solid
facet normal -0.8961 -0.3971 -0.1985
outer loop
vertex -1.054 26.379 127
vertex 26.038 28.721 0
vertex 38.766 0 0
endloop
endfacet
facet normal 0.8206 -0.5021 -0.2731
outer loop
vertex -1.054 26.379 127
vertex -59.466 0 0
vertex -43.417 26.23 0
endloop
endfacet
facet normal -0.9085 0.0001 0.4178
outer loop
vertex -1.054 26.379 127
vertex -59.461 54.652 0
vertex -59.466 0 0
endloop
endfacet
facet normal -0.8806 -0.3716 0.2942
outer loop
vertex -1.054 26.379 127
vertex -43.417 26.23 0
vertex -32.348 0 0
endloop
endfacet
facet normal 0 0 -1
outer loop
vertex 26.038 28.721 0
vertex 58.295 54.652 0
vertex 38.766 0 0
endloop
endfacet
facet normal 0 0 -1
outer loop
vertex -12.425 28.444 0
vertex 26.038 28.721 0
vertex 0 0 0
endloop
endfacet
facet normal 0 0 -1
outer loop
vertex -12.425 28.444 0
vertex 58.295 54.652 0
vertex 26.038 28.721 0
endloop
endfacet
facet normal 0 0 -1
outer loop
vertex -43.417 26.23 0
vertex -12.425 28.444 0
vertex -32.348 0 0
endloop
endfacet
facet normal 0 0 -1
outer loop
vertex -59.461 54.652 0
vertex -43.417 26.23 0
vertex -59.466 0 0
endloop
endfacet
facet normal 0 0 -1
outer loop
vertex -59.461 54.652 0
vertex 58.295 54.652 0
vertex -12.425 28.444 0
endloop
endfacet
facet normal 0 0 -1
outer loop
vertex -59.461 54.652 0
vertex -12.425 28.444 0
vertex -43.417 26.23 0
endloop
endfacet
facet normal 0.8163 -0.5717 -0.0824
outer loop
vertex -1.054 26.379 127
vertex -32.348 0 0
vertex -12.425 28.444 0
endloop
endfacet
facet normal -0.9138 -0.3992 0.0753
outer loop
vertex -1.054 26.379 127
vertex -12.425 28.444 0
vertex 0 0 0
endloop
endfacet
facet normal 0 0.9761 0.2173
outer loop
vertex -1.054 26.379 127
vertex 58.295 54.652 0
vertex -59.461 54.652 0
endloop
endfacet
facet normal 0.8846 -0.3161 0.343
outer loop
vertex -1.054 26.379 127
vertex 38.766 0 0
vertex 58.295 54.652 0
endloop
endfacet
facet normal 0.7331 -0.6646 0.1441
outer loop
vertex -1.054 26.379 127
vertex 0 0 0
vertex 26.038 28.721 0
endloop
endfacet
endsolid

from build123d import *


with BuildPart() as f3:
    # F0 (on Top) → F3 section 0
    with BuildSketch(Plane.XY, mode=Mode.PRIVATE) as f3_s0:
        Polygon((58.2950860262, 54.6516403556), (-59.4609826803, 54.6516403556), (-59.4657808542, 0), (-43.416608125, 26.23029612), (-32.3482118547, 0), (-12.4250994995, 28.4439753741), (0, 0), (26.0375738144, 28.7206843495), (38.7662313879, 0), align=None)
    loft([f3_s0.sketch, Vertex(-1.0539550567, 26.3785235584, 127)])


solid = f3.part
